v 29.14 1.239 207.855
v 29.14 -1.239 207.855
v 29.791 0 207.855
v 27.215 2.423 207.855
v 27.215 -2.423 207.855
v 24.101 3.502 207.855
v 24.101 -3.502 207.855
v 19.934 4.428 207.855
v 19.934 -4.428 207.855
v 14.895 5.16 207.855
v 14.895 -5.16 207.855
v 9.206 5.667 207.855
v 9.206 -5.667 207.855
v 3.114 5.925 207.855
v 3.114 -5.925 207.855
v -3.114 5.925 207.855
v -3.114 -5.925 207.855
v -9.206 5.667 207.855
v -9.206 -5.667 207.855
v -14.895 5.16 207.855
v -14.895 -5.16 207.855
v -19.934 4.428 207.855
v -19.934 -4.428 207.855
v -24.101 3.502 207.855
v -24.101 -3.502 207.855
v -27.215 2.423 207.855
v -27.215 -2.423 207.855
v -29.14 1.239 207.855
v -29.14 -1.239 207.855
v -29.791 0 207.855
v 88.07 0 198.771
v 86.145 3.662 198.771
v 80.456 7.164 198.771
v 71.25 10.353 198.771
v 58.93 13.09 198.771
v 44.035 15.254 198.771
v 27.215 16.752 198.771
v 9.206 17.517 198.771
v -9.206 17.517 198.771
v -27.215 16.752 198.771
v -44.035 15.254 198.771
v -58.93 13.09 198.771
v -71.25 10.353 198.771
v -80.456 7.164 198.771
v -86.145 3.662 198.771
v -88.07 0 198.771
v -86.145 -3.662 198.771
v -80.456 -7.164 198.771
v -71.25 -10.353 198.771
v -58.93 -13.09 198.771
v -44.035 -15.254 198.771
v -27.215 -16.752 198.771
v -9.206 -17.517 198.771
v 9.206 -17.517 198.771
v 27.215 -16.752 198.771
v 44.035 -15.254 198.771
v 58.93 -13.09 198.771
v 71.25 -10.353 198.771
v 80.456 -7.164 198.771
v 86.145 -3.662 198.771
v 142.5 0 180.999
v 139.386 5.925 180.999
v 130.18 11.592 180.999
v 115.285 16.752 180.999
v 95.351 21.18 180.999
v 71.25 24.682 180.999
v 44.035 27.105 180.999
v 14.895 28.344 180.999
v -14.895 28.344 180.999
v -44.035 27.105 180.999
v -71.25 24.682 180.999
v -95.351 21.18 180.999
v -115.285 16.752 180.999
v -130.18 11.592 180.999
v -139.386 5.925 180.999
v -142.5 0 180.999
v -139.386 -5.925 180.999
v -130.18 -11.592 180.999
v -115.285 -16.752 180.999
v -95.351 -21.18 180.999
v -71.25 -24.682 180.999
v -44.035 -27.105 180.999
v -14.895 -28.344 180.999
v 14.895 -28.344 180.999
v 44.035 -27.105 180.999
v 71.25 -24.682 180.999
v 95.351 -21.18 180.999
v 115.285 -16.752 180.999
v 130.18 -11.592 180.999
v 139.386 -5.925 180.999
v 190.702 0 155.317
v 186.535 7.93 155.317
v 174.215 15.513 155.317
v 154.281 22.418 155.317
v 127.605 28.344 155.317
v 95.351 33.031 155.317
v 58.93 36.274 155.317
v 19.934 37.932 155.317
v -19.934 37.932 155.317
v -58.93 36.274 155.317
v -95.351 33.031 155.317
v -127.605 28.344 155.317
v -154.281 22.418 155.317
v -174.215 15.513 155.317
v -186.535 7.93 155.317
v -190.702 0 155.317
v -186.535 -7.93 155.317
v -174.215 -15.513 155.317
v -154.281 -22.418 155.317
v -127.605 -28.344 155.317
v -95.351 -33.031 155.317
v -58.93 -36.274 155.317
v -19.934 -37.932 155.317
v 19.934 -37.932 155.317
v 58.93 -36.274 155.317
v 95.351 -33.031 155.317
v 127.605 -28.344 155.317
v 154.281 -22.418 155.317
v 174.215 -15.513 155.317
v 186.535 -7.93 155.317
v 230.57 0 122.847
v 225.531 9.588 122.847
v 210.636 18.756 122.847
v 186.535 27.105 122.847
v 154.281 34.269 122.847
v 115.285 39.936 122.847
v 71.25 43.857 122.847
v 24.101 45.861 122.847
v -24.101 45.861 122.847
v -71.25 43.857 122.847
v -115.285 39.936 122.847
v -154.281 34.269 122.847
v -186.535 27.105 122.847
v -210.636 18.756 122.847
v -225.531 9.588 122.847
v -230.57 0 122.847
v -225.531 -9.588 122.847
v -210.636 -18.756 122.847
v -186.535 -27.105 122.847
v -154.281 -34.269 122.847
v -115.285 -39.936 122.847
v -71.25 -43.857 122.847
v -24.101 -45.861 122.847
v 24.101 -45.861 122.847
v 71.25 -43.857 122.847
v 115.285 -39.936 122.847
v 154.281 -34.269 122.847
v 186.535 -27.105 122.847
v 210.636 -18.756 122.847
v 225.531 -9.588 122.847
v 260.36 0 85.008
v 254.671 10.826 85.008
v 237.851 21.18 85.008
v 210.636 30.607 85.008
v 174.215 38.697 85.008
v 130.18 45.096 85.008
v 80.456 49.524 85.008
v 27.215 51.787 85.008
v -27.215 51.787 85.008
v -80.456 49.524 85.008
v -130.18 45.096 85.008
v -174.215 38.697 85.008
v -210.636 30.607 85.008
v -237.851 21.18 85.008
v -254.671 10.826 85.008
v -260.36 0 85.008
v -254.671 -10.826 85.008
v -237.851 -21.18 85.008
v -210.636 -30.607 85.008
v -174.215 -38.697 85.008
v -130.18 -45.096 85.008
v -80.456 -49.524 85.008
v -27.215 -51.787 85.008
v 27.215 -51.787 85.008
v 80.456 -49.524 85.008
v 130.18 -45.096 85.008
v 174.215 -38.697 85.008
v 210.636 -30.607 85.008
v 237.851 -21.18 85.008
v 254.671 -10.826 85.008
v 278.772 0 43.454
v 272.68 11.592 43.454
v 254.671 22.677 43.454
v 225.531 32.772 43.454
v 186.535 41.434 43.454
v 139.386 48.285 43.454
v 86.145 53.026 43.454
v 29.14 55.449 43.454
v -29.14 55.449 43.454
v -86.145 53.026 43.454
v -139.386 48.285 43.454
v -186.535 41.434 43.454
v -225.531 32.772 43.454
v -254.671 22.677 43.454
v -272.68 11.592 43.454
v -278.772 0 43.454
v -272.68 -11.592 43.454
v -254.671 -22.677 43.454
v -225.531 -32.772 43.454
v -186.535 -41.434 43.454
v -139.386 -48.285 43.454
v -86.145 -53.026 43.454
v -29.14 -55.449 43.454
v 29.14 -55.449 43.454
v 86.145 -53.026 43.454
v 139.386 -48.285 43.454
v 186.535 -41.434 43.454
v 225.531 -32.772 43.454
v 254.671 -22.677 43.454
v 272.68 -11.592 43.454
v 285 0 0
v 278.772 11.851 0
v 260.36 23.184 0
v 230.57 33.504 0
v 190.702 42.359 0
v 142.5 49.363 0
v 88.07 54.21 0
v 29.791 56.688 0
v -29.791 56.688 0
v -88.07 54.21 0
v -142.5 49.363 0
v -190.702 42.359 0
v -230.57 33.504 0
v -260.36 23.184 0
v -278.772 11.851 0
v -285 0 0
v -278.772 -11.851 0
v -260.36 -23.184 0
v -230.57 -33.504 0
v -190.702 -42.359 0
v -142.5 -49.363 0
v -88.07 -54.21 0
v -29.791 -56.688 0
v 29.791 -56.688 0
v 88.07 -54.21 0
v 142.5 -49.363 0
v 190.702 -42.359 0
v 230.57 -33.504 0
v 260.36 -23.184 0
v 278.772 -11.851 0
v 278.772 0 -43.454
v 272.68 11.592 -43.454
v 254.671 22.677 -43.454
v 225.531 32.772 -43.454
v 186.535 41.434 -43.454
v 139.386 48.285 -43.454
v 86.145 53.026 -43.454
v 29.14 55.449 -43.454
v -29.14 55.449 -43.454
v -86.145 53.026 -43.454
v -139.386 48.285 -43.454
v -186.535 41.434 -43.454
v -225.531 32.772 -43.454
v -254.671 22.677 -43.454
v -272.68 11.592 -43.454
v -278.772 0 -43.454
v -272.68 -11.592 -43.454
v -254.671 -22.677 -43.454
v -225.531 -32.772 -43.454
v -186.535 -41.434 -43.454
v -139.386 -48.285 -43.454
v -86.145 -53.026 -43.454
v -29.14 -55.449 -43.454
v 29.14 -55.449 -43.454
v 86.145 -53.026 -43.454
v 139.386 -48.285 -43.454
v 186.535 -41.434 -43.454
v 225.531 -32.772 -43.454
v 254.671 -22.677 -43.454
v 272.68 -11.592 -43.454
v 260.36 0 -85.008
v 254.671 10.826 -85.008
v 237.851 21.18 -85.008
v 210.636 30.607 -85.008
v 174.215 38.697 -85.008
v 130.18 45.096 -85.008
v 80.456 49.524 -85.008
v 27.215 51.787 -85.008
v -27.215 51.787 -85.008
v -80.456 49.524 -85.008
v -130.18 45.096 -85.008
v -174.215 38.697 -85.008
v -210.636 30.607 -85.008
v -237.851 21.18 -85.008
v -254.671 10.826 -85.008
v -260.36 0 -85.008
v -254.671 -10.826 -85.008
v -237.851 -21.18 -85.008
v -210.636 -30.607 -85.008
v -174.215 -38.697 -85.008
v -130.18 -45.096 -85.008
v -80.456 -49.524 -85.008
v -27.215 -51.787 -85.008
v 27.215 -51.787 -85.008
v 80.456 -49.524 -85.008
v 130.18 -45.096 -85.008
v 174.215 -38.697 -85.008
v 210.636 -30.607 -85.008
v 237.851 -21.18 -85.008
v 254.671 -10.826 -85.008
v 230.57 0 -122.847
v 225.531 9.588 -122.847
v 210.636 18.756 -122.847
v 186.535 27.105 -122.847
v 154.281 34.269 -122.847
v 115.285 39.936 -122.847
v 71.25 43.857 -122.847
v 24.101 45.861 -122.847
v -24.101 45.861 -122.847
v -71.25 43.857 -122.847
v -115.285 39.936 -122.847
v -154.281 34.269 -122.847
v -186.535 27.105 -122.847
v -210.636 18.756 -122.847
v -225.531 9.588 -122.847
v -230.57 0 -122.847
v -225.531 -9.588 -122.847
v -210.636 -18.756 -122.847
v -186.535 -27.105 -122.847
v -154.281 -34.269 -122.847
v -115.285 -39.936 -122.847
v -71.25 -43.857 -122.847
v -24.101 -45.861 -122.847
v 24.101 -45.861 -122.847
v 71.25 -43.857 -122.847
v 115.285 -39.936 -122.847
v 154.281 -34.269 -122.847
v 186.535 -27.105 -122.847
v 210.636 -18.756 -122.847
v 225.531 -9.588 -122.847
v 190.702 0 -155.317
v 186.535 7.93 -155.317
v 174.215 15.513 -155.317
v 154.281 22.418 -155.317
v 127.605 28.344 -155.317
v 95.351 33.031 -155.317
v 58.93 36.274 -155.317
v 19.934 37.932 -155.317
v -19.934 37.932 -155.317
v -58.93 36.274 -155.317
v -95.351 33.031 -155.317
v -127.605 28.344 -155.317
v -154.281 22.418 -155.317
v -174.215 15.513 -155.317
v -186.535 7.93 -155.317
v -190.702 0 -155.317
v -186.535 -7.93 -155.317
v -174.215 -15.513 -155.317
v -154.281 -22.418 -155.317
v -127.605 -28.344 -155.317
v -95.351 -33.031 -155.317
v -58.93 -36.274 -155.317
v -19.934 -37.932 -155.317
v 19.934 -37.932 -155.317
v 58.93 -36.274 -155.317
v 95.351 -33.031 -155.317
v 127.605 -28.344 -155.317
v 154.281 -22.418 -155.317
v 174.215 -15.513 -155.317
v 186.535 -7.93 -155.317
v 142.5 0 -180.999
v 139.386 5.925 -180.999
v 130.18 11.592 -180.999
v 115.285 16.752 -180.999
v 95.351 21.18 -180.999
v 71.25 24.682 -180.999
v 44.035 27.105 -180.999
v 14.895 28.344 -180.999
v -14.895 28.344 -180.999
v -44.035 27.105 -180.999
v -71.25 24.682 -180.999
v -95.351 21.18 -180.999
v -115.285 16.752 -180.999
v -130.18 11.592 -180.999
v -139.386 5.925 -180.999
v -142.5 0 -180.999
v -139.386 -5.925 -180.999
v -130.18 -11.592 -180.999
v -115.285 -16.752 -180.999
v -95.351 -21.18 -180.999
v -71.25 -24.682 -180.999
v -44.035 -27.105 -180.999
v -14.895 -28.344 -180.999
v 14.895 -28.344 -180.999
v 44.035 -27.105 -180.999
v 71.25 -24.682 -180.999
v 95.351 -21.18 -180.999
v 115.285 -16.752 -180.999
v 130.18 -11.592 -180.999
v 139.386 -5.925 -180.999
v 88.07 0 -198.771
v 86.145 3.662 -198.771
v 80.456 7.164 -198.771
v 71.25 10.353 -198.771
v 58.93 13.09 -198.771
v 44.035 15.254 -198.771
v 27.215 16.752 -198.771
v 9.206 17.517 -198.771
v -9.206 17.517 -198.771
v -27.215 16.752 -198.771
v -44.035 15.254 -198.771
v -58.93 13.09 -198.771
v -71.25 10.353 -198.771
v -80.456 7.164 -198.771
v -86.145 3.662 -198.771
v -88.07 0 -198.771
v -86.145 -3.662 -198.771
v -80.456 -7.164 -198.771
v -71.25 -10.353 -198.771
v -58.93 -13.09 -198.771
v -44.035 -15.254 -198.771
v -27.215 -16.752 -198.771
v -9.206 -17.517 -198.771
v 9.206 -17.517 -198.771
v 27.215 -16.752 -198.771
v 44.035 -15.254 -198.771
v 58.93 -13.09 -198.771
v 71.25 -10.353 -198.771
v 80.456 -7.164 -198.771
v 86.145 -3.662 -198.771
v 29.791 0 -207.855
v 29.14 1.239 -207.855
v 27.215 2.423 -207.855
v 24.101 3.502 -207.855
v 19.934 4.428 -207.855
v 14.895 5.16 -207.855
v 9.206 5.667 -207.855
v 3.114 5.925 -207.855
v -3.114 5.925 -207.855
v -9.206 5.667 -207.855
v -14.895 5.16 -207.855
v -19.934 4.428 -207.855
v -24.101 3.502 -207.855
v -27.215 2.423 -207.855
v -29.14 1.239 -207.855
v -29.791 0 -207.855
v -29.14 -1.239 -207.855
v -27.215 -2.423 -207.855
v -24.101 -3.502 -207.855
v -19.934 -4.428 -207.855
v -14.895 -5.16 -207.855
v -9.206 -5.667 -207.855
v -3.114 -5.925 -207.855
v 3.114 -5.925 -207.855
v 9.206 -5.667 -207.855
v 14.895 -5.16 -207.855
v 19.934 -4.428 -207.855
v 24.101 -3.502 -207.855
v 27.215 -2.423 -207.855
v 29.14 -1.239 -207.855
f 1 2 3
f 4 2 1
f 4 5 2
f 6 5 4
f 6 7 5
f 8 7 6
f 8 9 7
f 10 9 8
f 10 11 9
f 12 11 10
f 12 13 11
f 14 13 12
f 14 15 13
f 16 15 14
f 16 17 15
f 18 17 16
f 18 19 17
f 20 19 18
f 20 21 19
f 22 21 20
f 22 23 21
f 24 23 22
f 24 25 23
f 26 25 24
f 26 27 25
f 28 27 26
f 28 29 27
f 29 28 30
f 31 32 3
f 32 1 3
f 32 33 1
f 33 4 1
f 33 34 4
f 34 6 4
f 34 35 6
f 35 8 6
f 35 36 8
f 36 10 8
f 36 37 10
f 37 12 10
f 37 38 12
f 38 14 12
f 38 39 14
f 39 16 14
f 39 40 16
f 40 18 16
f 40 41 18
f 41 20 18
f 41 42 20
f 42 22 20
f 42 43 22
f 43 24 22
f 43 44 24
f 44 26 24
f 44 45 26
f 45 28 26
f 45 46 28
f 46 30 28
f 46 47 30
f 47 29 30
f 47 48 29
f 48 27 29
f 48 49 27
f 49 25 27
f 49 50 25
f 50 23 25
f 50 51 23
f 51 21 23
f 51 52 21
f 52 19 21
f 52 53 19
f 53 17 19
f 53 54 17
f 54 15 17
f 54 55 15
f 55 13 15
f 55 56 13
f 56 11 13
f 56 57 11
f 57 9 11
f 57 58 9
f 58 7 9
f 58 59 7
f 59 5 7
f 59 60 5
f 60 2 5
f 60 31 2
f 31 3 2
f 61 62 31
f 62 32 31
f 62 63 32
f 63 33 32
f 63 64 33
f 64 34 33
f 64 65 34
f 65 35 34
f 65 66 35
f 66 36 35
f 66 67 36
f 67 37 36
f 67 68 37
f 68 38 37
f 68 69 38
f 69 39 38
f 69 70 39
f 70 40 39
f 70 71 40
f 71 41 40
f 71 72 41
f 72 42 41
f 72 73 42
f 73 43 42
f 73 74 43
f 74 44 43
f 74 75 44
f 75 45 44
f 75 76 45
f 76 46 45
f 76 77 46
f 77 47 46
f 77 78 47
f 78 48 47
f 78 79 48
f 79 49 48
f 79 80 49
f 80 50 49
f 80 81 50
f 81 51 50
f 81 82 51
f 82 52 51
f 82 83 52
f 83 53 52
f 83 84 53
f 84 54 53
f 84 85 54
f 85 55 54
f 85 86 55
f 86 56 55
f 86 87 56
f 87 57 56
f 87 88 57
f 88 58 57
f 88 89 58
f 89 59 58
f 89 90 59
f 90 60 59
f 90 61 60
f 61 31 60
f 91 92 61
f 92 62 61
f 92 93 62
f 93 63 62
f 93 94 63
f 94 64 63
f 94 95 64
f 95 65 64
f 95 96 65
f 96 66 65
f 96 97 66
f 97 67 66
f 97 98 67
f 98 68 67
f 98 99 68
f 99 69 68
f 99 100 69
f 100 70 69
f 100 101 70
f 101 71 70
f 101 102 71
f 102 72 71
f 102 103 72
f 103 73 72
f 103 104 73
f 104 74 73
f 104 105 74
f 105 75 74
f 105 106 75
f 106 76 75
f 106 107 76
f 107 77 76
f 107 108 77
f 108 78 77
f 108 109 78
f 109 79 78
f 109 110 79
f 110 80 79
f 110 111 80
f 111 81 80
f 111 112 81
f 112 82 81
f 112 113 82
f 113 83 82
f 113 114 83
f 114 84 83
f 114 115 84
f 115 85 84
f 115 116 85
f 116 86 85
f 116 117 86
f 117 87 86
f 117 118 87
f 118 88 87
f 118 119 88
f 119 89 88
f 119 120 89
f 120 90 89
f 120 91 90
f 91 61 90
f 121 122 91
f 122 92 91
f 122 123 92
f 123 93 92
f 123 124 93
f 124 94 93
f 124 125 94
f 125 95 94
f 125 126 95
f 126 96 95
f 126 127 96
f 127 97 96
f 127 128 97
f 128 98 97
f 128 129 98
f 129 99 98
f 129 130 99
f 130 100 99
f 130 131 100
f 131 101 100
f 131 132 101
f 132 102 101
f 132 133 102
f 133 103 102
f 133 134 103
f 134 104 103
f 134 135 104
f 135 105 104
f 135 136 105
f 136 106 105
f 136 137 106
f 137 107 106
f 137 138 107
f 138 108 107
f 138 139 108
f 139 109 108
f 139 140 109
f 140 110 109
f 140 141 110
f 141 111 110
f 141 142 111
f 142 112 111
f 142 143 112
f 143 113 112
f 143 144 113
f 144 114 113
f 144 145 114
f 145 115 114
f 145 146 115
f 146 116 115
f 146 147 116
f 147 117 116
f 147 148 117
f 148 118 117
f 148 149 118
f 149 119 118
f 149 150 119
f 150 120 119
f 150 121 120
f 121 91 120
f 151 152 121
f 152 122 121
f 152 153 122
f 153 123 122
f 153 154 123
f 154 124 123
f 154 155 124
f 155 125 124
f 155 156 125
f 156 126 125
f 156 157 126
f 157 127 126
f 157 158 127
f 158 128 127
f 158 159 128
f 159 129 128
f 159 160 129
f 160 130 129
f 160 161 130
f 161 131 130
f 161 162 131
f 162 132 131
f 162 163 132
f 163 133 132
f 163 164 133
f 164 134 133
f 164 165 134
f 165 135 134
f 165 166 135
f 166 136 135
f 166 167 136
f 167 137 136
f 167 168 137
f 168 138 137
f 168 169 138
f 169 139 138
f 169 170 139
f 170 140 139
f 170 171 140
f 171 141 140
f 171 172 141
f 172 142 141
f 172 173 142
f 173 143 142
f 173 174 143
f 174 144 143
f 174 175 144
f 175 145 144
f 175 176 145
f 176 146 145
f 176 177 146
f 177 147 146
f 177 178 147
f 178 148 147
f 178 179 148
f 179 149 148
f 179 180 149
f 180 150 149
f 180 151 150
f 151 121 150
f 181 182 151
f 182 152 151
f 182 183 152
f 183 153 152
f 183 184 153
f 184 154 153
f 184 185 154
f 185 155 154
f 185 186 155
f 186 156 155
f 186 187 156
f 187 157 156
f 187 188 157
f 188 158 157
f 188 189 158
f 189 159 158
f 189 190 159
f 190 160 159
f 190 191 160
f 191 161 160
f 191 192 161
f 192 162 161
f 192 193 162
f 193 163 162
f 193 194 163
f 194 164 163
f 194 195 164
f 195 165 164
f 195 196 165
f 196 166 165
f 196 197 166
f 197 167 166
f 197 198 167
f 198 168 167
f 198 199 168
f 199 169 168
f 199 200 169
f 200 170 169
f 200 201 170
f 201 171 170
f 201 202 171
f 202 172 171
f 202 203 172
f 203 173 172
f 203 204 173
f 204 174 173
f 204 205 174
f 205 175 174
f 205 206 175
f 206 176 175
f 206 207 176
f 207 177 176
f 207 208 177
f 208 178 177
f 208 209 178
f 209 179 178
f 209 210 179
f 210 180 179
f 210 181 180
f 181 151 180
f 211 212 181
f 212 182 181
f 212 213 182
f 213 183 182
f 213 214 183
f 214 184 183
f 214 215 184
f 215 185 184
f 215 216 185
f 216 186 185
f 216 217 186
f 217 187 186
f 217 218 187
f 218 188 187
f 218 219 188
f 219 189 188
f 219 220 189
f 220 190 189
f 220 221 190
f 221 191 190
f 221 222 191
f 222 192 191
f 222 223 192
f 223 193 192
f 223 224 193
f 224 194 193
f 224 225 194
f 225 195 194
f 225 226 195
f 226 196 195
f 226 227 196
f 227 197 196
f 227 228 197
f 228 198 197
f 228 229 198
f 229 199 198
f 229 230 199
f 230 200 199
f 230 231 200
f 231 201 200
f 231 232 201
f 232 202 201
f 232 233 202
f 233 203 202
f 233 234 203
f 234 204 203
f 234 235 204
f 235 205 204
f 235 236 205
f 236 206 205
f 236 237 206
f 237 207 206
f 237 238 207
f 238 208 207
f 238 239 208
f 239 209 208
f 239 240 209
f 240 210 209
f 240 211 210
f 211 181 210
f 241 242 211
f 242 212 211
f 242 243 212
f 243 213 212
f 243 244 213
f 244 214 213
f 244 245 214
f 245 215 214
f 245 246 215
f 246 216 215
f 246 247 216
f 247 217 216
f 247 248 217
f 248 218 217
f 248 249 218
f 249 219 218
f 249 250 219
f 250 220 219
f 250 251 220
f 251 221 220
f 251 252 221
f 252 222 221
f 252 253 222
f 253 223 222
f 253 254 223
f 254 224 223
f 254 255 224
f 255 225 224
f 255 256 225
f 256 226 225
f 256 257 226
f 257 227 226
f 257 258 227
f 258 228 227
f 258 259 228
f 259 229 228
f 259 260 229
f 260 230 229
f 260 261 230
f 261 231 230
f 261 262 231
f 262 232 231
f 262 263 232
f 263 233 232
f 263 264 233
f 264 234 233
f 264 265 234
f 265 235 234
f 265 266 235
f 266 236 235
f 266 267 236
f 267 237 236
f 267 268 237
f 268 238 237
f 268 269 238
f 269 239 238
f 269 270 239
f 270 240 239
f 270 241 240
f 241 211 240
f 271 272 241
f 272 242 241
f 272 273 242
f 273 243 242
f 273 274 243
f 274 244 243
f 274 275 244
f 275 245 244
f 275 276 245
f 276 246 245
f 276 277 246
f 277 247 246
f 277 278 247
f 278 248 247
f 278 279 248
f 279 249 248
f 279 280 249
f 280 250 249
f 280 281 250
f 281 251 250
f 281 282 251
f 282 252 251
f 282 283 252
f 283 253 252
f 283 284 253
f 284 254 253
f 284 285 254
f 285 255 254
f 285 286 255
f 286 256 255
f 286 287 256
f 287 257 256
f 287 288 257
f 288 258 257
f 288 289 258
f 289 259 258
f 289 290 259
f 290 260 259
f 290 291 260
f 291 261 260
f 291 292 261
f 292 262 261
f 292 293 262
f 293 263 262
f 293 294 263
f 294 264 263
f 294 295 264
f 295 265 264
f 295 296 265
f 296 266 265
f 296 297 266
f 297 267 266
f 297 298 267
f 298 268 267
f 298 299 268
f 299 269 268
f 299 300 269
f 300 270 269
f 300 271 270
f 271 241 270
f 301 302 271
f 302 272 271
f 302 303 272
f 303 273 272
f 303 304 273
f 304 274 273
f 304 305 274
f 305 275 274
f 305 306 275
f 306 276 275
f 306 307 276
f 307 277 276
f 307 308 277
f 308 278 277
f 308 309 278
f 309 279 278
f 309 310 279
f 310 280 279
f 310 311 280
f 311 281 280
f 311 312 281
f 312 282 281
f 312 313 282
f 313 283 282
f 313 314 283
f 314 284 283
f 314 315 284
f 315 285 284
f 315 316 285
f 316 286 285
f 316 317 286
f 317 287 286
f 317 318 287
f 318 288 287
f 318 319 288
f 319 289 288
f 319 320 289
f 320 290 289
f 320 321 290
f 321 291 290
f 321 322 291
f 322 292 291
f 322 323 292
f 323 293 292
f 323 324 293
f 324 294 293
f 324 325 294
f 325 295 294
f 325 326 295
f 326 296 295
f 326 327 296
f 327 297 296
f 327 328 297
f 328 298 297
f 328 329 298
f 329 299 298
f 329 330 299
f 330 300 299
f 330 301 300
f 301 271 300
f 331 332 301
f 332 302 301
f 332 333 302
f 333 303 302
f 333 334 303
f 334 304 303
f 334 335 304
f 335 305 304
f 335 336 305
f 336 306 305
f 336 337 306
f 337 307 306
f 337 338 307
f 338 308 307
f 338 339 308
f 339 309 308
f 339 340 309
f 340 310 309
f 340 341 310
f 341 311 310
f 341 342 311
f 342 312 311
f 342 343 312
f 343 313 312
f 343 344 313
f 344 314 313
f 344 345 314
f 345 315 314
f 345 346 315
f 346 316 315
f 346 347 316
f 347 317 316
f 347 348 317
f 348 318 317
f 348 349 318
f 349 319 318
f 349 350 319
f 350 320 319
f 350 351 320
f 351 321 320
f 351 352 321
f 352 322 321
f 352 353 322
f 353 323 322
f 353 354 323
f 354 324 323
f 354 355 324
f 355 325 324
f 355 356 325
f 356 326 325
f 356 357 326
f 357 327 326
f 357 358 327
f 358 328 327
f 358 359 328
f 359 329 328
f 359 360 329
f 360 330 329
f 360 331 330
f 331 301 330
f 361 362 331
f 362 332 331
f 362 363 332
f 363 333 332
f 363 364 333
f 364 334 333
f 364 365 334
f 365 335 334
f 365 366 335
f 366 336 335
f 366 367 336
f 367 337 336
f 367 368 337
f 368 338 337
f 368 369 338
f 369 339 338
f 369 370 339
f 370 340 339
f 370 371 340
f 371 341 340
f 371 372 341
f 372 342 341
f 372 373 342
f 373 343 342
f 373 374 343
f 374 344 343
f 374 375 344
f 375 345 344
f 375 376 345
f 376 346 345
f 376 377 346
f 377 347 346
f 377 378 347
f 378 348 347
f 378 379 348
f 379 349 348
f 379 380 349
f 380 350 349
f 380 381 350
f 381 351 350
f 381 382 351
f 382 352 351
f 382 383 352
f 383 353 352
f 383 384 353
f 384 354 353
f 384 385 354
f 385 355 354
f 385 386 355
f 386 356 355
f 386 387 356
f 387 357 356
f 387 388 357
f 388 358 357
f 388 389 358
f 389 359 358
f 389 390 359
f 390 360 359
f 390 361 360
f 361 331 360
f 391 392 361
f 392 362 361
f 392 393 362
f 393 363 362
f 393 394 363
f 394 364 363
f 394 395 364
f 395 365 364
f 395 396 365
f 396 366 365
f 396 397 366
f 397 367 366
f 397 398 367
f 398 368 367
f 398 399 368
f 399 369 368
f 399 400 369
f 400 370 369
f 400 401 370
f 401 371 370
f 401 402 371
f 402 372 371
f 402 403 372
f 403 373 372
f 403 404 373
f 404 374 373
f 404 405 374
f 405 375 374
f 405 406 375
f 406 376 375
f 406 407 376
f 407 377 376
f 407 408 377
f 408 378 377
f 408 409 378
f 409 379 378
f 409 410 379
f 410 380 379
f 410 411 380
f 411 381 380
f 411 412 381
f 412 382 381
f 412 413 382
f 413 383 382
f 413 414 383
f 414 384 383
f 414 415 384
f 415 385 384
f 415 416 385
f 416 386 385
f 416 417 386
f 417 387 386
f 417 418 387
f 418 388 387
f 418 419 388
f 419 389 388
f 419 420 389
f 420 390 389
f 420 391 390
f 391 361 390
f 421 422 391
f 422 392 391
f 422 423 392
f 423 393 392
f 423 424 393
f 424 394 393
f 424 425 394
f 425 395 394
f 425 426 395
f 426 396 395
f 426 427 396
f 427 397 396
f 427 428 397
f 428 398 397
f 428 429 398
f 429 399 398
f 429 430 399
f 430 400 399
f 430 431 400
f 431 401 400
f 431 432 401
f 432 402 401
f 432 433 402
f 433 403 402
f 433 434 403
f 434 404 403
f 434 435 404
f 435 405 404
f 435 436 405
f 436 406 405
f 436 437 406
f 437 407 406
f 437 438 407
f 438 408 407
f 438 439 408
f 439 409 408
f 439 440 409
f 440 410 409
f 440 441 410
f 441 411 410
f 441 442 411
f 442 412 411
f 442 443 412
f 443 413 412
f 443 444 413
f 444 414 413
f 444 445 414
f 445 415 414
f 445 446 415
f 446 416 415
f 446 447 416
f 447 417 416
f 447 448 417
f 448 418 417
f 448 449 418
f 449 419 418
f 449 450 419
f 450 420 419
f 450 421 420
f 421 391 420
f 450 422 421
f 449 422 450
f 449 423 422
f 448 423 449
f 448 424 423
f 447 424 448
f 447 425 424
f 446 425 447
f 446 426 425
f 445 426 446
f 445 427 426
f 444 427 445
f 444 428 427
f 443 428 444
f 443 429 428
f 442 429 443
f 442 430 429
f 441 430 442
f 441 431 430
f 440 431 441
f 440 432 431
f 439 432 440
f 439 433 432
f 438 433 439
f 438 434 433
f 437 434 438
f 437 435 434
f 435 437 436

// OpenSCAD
// Generated by SolidPython 1.0.1 on 2020-07-29 00:46:51


scale(v = [15, 3, 11]) {
	sphere(r = 19);
}
/***********************************************
*********      SolidPython code:      **********
************************************************
 
# import packages: SolidPython
from solid import *
from solid.utils import *
from itertools import chain, combinations, permutations


class Resize:

    def __init__(self, scad_file):
        self.scad_file = scad_file
        #self.scad_file = import_scad(scad_file)
        # cone/cylinder param:
        self.r1 = 0
        self.r2 = 0
        self.h = 0
        # rectangular prism param:
        self.w = 0
        self.l = 0
        # ellipse param:
        self.r = 0

    # import OpenScad code (file name corresponds to shape)


    # classify shape + parameters
    def assign(self, param1, param2, param3):
        if self.scad_file == 'cone.scad':
            self.r1 = param1
            self.r2 = param2
            self.h = param3
        elif self.scad_file == 'cylinder.scad':
            self.r1 = param1
            self.r2 = param2
            self.h = param3
        elif self.scad_file == 'rectangularPrism.scad':
            self.h = param1
            self.l = param2
            self.w = param3
        else:
            self.r = param1
            self.h = param2

    # resize parameters
    def iterate(self):
        x = range(3, 20, 2)
        i = 1
        if self.scad_file == 'cone.scad':
            tempList = list(permutations(x, 2))
            for temp in tempList:
                param1 = temp[0]
                param2 = temp[1]
                filepath = 'produced_scad_files/' + 'cone' + str(param1) + '_' + str(param2) + '_' + '.scad'
                scad_render_to_file(cylinder(h=param1, r1=param2, r2=0), filepath)

        elif self.scad_file == 'cylinder.scad':
            tempList = list(permutations(x, 3))
            for temp in tempList:
                param1 = temp[0]
                param2 = temp[1]
                filepath = 'produced_scad_files/' + 'cylinder' + str(param1) + '_' + str(param2) + '_' + '.scad'
                scad_render_to_file(cylinder(h=param1, r1=param2, r2=param2), filepath)

        elif self.scad_file == 'rectangularPrism.scad':
            tempList = list(permutations(x, 3))
            for temp in tempList:
                param1 = temp[0]
                param2 = temp[1]
                param3 = temp[2]
                filepath = 'produced_scad_files/' + 'rectangularPrism' + str(param1) + '_' + str(param2) + '_' + str(
                    param3) + '.scad'
                scad_render_to_file(cube(size=(param1, param2, param3)), filepath)

        elif self.scad_file == 'ellipse.scad':
            tempList = list(permutations(x, 4))
            for temp in tempList:
                param1 = temp[0]
                param2 = temp[1]
                param3 = temp[2]
                param4 = temp[3]
                filepath = 'produced_scad_files/' + 'ellipse' + str(param1) + '_' + str(param2) + '_' + str(param3) + '_' + str(param4) + '.scad'
                scad_render_to_file(scale([param1, param2, param3])(sphere(r=param4)), filepath)

    def render_to_scadfile(self):
        scad_render_to_file(scad, 'example.scad') 
 
************************************************/
